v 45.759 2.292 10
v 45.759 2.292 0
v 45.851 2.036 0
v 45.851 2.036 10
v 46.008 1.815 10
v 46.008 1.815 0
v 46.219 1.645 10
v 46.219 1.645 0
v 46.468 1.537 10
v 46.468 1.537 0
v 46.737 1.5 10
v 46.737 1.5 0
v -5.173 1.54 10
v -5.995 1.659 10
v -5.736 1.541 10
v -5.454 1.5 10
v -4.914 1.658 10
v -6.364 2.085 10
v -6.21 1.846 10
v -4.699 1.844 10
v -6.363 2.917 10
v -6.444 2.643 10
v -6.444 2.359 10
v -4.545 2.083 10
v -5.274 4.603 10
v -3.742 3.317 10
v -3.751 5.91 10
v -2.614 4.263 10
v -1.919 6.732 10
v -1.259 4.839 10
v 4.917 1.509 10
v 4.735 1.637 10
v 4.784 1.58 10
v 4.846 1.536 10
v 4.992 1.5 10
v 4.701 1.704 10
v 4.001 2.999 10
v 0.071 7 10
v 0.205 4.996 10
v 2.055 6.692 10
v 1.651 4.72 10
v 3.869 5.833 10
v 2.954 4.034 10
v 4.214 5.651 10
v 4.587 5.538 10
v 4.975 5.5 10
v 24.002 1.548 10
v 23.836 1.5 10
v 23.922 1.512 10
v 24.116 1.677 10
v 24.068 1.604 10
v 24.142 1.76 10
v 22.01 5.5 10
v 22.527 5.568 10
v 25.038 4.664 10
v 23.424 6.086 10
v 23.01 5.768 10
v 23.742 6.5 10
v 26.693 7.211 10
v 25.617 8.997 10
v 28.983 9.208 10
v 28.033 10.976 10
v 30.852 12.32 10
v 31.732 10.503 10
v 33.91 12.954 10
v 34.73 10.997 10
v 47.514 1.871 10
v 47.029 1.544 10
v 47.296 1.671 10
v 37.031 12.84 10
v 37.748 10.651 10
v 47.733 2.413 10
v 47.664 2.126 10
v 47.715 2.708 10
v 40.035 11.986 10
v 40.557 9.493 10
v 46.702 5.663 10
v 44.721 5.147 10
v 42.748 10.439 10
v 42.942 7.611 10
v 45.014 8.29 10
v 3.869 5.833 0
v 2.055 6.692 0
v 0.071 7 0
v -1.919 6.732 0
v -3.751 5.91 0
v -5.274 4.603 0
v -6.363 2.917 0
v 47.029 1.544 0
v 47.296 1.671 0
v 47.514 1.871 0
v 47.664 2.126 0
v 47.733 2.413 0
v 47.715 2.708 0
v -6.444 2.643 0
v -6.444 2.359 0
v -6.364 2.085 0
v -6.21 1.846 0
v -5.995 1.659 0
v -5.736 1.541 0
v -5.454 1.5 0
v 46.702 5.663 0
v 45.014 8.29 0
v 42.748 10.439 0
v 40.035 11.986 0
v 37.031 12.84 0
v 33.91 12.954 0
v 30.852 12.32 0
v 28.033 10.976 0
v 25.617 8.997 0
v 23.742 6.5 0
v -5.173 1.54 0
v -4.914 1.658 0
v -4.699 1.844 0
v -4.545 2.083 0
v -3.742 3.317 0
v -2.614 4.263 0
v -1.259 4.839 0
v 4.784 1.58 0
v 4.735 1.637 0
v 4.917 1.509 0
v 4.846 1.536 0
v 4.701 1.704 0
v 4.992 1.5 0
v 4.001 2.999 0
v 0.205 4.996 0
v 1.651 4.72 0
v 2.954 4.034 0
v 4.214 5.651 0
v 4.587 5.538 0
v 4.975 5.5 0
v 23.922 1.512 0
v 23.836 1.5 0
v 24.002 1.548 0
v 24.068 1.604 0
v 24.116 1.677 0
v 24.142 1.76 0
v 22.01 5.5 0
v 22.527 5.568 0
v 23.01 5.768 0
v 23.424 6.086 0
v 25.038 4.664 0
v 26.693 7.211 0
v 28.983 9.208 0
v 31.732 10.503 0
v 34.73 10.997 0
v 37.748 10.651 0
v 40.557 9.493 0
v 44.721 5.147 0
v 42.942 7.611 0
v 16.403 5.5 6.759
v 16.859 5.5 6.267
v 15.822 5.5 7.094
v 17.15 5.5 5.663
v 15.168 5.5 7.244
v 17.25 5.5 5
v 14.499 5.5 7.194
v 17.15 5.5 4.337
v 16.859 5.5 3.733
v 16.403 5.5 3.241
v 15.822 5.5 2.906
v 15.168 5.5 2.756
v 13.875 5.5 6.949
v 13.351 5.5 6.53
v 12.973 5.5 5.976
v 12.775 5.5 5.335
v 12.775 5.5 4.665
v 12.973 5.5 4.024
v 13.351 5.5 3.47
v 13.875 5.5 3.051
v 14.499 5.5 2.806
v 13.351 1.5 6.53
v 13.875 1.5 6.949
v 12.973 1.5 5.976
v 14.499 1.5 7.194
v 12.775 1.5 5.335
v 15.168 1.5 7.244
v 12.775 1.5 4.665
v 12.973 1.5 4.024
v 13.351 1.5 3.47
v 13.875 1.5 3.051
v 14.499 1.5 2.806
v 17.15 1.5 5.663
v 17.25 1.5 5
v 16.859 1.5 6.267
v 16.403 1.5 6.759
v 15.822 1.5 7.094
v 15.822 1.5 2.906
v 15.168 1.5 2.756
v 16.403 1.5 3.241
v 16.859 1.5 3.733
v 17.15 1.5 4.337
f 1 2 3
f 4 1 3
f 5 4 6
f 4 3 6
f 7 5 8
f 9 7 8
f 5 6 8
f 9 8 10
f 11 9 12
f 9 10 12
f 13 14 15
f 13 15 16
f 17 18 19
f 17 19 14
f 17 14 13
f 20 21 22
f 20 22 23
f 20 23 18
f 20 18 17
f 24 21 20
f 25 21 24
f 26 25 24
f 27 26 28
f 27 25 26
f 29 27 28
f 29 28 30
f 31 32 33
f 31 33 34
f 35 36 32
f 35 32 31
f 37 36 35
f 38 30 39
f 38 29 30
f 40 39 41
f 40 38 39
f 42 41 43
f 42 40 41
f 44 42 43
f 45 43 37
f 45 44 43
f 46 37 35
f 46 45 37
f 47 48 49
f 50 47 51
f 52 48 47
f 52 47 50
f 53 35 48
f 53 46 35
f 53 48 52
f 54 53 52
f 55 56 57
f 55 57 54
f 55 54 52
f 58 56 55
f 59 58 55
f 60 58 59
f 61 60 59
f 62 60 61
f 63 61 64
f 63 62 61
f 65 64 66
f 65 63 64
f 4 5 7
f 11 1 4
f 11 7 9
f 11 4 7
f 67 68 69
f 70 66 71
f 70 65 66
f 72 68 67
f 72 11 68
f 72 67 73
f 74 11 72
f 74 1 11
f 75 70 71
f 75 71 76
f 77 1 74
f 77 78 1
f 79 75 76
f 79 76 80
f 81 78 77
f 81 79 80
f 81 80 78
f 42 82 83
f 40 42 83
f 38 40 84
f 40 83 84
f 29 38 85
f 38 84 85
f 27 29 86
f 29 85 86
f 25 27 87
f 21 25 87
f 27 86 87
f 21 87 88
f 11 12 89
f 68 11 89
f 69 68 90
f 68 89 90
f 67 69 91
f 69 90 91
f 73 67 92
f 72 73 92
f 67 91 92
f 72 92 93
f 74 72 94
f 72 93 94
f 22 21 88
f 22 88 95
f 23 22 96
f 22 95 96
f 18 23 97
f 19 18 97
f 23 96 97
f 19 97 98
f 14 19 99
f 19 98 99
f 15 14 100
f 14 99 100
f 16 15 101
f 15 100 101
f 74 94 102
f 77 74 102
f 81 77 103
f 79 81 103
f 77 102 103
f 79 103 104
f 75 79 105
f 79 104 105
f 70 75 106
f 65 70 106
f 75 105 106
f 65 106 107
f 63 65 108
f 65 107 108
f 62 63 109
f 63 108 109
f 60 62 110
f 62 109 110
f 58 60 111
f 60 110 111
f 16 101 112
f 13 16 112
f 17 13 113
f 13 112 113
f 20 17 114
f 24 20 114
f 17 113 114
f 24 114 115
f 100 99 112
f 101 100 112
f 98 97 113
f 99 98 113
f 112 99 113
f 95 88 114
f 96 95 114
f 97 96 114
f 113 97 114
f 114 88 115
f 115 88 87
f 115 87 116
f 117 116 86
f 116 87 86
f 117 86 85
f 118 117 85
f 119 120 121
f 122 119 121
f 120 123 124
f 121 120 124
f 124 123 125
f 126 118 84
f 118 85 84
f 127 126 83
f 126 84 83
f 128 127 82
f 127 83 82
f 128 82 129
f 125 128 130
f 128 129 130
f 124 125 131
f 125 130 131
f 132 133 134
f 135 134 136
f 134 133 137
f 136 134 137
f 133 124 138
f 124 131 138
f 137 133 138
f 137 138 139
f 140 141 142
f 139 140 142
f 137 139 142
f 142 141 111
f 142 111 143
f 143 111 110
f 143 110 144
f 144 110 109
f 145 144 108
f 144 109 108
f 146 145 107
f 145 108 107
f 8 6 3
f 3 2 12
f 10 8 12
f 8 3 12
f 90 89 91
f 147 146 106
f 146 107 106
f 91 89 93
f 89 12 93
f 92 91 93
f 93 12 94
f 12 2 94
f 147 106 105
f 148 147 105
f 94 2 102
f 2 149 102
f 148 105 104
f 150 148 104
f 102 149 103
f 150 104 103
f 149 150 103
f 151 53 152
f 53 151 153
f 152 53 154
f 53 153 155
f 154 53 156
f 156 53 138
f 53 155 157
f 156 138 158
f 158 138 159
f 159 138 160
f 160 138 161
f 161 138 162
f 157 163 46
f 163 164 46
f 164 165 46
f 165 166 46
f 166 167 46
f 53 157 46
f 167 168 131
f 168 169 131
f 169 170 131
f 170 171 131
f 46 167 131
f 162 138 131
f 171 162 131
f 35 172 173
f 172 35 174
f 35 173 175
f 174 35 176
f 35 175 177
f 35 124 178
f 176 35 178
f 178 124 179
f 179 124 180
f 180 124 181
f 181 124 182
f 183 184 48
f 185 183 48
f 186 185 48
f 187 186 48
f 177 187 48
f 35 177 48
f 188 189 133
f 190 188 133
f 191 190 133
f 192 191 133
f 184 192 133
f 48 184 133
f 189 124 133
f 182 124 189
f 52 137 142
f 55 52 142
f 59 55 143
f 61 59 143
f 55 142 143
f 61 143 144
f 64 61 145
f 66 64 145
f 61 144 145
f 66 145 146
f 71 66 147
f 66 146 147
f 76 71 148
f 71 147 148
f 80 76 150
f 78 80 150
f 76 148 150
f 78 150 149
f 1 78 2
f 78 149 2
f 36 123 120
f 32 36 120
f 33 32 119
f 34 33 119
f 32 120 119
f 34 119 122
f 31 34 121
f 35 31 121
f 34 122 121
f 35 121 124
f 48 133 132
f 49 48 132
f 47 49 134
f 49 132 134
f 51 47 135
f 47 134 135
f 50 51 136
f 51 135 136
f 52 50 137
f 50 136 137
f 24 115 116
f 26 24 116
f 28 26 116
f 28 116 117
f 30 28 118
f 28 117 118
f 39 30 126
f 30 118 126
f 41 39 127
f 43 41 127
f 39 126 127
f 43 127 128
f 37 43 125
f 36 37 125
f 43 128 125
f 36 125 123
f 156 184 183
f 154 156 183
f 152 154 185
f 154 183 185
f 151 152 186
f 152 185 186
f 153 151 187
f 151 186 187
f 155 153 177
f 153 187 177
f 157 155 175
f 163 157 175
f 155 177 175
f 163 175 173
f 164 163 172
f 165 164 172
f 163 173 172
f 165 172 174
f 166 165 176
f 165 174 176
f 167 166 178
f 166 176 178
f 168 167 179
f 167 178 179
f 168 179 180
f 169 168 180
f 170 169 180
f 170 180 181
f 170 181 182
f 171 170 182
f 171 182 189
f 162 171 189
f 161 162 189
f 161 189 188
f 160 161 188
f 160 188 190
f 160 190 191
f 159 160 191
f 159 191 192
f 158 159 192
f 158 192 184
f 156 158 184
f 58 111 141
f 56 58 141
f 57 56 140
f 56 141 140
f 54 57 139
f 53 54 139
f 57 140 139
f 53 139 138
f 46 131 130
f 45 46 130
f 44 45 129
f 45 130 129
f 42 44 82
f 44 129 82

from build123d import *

# Parameters (mm, degrees)
F1_DEPTH = 10
F2_R     = 2.25
F3_DEPTH = 25


with BuildPart() as f1:
    # F0 (on Top) → F1 (new body)
    with BuildSketch(Plane.XY):
        with BuildLine():
            ThreePointArc((-4.545297, 2.083333), (0.204825, 4.995803), (4.700586, 1.704257))
            ThreePointArc((4.700586, 1.704257), (4.814012, 1.556152), (4.991909, 1.5))
            Line((4.991909, 1.5), (23.835874, 1.5))
            ThreePointArc((23.835874, 1.5), (24.036696, 1.57388), (24.14176, 1.760291))
            ThreePointArc((24.14176, 1.760291), (34.729685, 10.996678), (45.758637, 2.291667))
            ThreePointArc((45.758637, 2.291667), (46.107542, 1.722718), (46.736695, 1.5))
            ThreePointArc((46.736695, 1.5), (47.513976, 1.870847), (47.714752, 2.708333))
            ThreePointArc((47.714752, 2.708333), (37.03088, 12.840386), (23.74167, 6.5))
            ThreePointArc((23.74167, 6.5), (23.009619, 5.767949), (22.009619, 5.5))
            Line((22.009619, 5.5), (4.974937, 5.5))
            ThreePointArc((4.974937, 5.5), (4.397587, 5.585146), (3.869396, 5.833333))
            ThreePointArc((3.869396, 5.833333), (-1.918794, 6.731882), (-6.363415, 2.916667))
            ThreePointArc((-6.363415, 2.916667), (-6.295981, 1.959938), (-5.454356, 1.5))
            ThreePointArc((-5.454356, 1.5), (-4.914294, 1.658375), (-4.545297, 2.083333))
        make_face()
    extrude(amount=F1_DEPTH)

    # F2 (on face) → F3 (cut)
    with BuildSketch(Plane.XZ.offset(-1.5)):
        with Locations((15, 5)):
            Circle(F2_R)
    extrude(amount=-F3_DEPTH, mode=Mode.SUBTRACT)


solid = f1.part
